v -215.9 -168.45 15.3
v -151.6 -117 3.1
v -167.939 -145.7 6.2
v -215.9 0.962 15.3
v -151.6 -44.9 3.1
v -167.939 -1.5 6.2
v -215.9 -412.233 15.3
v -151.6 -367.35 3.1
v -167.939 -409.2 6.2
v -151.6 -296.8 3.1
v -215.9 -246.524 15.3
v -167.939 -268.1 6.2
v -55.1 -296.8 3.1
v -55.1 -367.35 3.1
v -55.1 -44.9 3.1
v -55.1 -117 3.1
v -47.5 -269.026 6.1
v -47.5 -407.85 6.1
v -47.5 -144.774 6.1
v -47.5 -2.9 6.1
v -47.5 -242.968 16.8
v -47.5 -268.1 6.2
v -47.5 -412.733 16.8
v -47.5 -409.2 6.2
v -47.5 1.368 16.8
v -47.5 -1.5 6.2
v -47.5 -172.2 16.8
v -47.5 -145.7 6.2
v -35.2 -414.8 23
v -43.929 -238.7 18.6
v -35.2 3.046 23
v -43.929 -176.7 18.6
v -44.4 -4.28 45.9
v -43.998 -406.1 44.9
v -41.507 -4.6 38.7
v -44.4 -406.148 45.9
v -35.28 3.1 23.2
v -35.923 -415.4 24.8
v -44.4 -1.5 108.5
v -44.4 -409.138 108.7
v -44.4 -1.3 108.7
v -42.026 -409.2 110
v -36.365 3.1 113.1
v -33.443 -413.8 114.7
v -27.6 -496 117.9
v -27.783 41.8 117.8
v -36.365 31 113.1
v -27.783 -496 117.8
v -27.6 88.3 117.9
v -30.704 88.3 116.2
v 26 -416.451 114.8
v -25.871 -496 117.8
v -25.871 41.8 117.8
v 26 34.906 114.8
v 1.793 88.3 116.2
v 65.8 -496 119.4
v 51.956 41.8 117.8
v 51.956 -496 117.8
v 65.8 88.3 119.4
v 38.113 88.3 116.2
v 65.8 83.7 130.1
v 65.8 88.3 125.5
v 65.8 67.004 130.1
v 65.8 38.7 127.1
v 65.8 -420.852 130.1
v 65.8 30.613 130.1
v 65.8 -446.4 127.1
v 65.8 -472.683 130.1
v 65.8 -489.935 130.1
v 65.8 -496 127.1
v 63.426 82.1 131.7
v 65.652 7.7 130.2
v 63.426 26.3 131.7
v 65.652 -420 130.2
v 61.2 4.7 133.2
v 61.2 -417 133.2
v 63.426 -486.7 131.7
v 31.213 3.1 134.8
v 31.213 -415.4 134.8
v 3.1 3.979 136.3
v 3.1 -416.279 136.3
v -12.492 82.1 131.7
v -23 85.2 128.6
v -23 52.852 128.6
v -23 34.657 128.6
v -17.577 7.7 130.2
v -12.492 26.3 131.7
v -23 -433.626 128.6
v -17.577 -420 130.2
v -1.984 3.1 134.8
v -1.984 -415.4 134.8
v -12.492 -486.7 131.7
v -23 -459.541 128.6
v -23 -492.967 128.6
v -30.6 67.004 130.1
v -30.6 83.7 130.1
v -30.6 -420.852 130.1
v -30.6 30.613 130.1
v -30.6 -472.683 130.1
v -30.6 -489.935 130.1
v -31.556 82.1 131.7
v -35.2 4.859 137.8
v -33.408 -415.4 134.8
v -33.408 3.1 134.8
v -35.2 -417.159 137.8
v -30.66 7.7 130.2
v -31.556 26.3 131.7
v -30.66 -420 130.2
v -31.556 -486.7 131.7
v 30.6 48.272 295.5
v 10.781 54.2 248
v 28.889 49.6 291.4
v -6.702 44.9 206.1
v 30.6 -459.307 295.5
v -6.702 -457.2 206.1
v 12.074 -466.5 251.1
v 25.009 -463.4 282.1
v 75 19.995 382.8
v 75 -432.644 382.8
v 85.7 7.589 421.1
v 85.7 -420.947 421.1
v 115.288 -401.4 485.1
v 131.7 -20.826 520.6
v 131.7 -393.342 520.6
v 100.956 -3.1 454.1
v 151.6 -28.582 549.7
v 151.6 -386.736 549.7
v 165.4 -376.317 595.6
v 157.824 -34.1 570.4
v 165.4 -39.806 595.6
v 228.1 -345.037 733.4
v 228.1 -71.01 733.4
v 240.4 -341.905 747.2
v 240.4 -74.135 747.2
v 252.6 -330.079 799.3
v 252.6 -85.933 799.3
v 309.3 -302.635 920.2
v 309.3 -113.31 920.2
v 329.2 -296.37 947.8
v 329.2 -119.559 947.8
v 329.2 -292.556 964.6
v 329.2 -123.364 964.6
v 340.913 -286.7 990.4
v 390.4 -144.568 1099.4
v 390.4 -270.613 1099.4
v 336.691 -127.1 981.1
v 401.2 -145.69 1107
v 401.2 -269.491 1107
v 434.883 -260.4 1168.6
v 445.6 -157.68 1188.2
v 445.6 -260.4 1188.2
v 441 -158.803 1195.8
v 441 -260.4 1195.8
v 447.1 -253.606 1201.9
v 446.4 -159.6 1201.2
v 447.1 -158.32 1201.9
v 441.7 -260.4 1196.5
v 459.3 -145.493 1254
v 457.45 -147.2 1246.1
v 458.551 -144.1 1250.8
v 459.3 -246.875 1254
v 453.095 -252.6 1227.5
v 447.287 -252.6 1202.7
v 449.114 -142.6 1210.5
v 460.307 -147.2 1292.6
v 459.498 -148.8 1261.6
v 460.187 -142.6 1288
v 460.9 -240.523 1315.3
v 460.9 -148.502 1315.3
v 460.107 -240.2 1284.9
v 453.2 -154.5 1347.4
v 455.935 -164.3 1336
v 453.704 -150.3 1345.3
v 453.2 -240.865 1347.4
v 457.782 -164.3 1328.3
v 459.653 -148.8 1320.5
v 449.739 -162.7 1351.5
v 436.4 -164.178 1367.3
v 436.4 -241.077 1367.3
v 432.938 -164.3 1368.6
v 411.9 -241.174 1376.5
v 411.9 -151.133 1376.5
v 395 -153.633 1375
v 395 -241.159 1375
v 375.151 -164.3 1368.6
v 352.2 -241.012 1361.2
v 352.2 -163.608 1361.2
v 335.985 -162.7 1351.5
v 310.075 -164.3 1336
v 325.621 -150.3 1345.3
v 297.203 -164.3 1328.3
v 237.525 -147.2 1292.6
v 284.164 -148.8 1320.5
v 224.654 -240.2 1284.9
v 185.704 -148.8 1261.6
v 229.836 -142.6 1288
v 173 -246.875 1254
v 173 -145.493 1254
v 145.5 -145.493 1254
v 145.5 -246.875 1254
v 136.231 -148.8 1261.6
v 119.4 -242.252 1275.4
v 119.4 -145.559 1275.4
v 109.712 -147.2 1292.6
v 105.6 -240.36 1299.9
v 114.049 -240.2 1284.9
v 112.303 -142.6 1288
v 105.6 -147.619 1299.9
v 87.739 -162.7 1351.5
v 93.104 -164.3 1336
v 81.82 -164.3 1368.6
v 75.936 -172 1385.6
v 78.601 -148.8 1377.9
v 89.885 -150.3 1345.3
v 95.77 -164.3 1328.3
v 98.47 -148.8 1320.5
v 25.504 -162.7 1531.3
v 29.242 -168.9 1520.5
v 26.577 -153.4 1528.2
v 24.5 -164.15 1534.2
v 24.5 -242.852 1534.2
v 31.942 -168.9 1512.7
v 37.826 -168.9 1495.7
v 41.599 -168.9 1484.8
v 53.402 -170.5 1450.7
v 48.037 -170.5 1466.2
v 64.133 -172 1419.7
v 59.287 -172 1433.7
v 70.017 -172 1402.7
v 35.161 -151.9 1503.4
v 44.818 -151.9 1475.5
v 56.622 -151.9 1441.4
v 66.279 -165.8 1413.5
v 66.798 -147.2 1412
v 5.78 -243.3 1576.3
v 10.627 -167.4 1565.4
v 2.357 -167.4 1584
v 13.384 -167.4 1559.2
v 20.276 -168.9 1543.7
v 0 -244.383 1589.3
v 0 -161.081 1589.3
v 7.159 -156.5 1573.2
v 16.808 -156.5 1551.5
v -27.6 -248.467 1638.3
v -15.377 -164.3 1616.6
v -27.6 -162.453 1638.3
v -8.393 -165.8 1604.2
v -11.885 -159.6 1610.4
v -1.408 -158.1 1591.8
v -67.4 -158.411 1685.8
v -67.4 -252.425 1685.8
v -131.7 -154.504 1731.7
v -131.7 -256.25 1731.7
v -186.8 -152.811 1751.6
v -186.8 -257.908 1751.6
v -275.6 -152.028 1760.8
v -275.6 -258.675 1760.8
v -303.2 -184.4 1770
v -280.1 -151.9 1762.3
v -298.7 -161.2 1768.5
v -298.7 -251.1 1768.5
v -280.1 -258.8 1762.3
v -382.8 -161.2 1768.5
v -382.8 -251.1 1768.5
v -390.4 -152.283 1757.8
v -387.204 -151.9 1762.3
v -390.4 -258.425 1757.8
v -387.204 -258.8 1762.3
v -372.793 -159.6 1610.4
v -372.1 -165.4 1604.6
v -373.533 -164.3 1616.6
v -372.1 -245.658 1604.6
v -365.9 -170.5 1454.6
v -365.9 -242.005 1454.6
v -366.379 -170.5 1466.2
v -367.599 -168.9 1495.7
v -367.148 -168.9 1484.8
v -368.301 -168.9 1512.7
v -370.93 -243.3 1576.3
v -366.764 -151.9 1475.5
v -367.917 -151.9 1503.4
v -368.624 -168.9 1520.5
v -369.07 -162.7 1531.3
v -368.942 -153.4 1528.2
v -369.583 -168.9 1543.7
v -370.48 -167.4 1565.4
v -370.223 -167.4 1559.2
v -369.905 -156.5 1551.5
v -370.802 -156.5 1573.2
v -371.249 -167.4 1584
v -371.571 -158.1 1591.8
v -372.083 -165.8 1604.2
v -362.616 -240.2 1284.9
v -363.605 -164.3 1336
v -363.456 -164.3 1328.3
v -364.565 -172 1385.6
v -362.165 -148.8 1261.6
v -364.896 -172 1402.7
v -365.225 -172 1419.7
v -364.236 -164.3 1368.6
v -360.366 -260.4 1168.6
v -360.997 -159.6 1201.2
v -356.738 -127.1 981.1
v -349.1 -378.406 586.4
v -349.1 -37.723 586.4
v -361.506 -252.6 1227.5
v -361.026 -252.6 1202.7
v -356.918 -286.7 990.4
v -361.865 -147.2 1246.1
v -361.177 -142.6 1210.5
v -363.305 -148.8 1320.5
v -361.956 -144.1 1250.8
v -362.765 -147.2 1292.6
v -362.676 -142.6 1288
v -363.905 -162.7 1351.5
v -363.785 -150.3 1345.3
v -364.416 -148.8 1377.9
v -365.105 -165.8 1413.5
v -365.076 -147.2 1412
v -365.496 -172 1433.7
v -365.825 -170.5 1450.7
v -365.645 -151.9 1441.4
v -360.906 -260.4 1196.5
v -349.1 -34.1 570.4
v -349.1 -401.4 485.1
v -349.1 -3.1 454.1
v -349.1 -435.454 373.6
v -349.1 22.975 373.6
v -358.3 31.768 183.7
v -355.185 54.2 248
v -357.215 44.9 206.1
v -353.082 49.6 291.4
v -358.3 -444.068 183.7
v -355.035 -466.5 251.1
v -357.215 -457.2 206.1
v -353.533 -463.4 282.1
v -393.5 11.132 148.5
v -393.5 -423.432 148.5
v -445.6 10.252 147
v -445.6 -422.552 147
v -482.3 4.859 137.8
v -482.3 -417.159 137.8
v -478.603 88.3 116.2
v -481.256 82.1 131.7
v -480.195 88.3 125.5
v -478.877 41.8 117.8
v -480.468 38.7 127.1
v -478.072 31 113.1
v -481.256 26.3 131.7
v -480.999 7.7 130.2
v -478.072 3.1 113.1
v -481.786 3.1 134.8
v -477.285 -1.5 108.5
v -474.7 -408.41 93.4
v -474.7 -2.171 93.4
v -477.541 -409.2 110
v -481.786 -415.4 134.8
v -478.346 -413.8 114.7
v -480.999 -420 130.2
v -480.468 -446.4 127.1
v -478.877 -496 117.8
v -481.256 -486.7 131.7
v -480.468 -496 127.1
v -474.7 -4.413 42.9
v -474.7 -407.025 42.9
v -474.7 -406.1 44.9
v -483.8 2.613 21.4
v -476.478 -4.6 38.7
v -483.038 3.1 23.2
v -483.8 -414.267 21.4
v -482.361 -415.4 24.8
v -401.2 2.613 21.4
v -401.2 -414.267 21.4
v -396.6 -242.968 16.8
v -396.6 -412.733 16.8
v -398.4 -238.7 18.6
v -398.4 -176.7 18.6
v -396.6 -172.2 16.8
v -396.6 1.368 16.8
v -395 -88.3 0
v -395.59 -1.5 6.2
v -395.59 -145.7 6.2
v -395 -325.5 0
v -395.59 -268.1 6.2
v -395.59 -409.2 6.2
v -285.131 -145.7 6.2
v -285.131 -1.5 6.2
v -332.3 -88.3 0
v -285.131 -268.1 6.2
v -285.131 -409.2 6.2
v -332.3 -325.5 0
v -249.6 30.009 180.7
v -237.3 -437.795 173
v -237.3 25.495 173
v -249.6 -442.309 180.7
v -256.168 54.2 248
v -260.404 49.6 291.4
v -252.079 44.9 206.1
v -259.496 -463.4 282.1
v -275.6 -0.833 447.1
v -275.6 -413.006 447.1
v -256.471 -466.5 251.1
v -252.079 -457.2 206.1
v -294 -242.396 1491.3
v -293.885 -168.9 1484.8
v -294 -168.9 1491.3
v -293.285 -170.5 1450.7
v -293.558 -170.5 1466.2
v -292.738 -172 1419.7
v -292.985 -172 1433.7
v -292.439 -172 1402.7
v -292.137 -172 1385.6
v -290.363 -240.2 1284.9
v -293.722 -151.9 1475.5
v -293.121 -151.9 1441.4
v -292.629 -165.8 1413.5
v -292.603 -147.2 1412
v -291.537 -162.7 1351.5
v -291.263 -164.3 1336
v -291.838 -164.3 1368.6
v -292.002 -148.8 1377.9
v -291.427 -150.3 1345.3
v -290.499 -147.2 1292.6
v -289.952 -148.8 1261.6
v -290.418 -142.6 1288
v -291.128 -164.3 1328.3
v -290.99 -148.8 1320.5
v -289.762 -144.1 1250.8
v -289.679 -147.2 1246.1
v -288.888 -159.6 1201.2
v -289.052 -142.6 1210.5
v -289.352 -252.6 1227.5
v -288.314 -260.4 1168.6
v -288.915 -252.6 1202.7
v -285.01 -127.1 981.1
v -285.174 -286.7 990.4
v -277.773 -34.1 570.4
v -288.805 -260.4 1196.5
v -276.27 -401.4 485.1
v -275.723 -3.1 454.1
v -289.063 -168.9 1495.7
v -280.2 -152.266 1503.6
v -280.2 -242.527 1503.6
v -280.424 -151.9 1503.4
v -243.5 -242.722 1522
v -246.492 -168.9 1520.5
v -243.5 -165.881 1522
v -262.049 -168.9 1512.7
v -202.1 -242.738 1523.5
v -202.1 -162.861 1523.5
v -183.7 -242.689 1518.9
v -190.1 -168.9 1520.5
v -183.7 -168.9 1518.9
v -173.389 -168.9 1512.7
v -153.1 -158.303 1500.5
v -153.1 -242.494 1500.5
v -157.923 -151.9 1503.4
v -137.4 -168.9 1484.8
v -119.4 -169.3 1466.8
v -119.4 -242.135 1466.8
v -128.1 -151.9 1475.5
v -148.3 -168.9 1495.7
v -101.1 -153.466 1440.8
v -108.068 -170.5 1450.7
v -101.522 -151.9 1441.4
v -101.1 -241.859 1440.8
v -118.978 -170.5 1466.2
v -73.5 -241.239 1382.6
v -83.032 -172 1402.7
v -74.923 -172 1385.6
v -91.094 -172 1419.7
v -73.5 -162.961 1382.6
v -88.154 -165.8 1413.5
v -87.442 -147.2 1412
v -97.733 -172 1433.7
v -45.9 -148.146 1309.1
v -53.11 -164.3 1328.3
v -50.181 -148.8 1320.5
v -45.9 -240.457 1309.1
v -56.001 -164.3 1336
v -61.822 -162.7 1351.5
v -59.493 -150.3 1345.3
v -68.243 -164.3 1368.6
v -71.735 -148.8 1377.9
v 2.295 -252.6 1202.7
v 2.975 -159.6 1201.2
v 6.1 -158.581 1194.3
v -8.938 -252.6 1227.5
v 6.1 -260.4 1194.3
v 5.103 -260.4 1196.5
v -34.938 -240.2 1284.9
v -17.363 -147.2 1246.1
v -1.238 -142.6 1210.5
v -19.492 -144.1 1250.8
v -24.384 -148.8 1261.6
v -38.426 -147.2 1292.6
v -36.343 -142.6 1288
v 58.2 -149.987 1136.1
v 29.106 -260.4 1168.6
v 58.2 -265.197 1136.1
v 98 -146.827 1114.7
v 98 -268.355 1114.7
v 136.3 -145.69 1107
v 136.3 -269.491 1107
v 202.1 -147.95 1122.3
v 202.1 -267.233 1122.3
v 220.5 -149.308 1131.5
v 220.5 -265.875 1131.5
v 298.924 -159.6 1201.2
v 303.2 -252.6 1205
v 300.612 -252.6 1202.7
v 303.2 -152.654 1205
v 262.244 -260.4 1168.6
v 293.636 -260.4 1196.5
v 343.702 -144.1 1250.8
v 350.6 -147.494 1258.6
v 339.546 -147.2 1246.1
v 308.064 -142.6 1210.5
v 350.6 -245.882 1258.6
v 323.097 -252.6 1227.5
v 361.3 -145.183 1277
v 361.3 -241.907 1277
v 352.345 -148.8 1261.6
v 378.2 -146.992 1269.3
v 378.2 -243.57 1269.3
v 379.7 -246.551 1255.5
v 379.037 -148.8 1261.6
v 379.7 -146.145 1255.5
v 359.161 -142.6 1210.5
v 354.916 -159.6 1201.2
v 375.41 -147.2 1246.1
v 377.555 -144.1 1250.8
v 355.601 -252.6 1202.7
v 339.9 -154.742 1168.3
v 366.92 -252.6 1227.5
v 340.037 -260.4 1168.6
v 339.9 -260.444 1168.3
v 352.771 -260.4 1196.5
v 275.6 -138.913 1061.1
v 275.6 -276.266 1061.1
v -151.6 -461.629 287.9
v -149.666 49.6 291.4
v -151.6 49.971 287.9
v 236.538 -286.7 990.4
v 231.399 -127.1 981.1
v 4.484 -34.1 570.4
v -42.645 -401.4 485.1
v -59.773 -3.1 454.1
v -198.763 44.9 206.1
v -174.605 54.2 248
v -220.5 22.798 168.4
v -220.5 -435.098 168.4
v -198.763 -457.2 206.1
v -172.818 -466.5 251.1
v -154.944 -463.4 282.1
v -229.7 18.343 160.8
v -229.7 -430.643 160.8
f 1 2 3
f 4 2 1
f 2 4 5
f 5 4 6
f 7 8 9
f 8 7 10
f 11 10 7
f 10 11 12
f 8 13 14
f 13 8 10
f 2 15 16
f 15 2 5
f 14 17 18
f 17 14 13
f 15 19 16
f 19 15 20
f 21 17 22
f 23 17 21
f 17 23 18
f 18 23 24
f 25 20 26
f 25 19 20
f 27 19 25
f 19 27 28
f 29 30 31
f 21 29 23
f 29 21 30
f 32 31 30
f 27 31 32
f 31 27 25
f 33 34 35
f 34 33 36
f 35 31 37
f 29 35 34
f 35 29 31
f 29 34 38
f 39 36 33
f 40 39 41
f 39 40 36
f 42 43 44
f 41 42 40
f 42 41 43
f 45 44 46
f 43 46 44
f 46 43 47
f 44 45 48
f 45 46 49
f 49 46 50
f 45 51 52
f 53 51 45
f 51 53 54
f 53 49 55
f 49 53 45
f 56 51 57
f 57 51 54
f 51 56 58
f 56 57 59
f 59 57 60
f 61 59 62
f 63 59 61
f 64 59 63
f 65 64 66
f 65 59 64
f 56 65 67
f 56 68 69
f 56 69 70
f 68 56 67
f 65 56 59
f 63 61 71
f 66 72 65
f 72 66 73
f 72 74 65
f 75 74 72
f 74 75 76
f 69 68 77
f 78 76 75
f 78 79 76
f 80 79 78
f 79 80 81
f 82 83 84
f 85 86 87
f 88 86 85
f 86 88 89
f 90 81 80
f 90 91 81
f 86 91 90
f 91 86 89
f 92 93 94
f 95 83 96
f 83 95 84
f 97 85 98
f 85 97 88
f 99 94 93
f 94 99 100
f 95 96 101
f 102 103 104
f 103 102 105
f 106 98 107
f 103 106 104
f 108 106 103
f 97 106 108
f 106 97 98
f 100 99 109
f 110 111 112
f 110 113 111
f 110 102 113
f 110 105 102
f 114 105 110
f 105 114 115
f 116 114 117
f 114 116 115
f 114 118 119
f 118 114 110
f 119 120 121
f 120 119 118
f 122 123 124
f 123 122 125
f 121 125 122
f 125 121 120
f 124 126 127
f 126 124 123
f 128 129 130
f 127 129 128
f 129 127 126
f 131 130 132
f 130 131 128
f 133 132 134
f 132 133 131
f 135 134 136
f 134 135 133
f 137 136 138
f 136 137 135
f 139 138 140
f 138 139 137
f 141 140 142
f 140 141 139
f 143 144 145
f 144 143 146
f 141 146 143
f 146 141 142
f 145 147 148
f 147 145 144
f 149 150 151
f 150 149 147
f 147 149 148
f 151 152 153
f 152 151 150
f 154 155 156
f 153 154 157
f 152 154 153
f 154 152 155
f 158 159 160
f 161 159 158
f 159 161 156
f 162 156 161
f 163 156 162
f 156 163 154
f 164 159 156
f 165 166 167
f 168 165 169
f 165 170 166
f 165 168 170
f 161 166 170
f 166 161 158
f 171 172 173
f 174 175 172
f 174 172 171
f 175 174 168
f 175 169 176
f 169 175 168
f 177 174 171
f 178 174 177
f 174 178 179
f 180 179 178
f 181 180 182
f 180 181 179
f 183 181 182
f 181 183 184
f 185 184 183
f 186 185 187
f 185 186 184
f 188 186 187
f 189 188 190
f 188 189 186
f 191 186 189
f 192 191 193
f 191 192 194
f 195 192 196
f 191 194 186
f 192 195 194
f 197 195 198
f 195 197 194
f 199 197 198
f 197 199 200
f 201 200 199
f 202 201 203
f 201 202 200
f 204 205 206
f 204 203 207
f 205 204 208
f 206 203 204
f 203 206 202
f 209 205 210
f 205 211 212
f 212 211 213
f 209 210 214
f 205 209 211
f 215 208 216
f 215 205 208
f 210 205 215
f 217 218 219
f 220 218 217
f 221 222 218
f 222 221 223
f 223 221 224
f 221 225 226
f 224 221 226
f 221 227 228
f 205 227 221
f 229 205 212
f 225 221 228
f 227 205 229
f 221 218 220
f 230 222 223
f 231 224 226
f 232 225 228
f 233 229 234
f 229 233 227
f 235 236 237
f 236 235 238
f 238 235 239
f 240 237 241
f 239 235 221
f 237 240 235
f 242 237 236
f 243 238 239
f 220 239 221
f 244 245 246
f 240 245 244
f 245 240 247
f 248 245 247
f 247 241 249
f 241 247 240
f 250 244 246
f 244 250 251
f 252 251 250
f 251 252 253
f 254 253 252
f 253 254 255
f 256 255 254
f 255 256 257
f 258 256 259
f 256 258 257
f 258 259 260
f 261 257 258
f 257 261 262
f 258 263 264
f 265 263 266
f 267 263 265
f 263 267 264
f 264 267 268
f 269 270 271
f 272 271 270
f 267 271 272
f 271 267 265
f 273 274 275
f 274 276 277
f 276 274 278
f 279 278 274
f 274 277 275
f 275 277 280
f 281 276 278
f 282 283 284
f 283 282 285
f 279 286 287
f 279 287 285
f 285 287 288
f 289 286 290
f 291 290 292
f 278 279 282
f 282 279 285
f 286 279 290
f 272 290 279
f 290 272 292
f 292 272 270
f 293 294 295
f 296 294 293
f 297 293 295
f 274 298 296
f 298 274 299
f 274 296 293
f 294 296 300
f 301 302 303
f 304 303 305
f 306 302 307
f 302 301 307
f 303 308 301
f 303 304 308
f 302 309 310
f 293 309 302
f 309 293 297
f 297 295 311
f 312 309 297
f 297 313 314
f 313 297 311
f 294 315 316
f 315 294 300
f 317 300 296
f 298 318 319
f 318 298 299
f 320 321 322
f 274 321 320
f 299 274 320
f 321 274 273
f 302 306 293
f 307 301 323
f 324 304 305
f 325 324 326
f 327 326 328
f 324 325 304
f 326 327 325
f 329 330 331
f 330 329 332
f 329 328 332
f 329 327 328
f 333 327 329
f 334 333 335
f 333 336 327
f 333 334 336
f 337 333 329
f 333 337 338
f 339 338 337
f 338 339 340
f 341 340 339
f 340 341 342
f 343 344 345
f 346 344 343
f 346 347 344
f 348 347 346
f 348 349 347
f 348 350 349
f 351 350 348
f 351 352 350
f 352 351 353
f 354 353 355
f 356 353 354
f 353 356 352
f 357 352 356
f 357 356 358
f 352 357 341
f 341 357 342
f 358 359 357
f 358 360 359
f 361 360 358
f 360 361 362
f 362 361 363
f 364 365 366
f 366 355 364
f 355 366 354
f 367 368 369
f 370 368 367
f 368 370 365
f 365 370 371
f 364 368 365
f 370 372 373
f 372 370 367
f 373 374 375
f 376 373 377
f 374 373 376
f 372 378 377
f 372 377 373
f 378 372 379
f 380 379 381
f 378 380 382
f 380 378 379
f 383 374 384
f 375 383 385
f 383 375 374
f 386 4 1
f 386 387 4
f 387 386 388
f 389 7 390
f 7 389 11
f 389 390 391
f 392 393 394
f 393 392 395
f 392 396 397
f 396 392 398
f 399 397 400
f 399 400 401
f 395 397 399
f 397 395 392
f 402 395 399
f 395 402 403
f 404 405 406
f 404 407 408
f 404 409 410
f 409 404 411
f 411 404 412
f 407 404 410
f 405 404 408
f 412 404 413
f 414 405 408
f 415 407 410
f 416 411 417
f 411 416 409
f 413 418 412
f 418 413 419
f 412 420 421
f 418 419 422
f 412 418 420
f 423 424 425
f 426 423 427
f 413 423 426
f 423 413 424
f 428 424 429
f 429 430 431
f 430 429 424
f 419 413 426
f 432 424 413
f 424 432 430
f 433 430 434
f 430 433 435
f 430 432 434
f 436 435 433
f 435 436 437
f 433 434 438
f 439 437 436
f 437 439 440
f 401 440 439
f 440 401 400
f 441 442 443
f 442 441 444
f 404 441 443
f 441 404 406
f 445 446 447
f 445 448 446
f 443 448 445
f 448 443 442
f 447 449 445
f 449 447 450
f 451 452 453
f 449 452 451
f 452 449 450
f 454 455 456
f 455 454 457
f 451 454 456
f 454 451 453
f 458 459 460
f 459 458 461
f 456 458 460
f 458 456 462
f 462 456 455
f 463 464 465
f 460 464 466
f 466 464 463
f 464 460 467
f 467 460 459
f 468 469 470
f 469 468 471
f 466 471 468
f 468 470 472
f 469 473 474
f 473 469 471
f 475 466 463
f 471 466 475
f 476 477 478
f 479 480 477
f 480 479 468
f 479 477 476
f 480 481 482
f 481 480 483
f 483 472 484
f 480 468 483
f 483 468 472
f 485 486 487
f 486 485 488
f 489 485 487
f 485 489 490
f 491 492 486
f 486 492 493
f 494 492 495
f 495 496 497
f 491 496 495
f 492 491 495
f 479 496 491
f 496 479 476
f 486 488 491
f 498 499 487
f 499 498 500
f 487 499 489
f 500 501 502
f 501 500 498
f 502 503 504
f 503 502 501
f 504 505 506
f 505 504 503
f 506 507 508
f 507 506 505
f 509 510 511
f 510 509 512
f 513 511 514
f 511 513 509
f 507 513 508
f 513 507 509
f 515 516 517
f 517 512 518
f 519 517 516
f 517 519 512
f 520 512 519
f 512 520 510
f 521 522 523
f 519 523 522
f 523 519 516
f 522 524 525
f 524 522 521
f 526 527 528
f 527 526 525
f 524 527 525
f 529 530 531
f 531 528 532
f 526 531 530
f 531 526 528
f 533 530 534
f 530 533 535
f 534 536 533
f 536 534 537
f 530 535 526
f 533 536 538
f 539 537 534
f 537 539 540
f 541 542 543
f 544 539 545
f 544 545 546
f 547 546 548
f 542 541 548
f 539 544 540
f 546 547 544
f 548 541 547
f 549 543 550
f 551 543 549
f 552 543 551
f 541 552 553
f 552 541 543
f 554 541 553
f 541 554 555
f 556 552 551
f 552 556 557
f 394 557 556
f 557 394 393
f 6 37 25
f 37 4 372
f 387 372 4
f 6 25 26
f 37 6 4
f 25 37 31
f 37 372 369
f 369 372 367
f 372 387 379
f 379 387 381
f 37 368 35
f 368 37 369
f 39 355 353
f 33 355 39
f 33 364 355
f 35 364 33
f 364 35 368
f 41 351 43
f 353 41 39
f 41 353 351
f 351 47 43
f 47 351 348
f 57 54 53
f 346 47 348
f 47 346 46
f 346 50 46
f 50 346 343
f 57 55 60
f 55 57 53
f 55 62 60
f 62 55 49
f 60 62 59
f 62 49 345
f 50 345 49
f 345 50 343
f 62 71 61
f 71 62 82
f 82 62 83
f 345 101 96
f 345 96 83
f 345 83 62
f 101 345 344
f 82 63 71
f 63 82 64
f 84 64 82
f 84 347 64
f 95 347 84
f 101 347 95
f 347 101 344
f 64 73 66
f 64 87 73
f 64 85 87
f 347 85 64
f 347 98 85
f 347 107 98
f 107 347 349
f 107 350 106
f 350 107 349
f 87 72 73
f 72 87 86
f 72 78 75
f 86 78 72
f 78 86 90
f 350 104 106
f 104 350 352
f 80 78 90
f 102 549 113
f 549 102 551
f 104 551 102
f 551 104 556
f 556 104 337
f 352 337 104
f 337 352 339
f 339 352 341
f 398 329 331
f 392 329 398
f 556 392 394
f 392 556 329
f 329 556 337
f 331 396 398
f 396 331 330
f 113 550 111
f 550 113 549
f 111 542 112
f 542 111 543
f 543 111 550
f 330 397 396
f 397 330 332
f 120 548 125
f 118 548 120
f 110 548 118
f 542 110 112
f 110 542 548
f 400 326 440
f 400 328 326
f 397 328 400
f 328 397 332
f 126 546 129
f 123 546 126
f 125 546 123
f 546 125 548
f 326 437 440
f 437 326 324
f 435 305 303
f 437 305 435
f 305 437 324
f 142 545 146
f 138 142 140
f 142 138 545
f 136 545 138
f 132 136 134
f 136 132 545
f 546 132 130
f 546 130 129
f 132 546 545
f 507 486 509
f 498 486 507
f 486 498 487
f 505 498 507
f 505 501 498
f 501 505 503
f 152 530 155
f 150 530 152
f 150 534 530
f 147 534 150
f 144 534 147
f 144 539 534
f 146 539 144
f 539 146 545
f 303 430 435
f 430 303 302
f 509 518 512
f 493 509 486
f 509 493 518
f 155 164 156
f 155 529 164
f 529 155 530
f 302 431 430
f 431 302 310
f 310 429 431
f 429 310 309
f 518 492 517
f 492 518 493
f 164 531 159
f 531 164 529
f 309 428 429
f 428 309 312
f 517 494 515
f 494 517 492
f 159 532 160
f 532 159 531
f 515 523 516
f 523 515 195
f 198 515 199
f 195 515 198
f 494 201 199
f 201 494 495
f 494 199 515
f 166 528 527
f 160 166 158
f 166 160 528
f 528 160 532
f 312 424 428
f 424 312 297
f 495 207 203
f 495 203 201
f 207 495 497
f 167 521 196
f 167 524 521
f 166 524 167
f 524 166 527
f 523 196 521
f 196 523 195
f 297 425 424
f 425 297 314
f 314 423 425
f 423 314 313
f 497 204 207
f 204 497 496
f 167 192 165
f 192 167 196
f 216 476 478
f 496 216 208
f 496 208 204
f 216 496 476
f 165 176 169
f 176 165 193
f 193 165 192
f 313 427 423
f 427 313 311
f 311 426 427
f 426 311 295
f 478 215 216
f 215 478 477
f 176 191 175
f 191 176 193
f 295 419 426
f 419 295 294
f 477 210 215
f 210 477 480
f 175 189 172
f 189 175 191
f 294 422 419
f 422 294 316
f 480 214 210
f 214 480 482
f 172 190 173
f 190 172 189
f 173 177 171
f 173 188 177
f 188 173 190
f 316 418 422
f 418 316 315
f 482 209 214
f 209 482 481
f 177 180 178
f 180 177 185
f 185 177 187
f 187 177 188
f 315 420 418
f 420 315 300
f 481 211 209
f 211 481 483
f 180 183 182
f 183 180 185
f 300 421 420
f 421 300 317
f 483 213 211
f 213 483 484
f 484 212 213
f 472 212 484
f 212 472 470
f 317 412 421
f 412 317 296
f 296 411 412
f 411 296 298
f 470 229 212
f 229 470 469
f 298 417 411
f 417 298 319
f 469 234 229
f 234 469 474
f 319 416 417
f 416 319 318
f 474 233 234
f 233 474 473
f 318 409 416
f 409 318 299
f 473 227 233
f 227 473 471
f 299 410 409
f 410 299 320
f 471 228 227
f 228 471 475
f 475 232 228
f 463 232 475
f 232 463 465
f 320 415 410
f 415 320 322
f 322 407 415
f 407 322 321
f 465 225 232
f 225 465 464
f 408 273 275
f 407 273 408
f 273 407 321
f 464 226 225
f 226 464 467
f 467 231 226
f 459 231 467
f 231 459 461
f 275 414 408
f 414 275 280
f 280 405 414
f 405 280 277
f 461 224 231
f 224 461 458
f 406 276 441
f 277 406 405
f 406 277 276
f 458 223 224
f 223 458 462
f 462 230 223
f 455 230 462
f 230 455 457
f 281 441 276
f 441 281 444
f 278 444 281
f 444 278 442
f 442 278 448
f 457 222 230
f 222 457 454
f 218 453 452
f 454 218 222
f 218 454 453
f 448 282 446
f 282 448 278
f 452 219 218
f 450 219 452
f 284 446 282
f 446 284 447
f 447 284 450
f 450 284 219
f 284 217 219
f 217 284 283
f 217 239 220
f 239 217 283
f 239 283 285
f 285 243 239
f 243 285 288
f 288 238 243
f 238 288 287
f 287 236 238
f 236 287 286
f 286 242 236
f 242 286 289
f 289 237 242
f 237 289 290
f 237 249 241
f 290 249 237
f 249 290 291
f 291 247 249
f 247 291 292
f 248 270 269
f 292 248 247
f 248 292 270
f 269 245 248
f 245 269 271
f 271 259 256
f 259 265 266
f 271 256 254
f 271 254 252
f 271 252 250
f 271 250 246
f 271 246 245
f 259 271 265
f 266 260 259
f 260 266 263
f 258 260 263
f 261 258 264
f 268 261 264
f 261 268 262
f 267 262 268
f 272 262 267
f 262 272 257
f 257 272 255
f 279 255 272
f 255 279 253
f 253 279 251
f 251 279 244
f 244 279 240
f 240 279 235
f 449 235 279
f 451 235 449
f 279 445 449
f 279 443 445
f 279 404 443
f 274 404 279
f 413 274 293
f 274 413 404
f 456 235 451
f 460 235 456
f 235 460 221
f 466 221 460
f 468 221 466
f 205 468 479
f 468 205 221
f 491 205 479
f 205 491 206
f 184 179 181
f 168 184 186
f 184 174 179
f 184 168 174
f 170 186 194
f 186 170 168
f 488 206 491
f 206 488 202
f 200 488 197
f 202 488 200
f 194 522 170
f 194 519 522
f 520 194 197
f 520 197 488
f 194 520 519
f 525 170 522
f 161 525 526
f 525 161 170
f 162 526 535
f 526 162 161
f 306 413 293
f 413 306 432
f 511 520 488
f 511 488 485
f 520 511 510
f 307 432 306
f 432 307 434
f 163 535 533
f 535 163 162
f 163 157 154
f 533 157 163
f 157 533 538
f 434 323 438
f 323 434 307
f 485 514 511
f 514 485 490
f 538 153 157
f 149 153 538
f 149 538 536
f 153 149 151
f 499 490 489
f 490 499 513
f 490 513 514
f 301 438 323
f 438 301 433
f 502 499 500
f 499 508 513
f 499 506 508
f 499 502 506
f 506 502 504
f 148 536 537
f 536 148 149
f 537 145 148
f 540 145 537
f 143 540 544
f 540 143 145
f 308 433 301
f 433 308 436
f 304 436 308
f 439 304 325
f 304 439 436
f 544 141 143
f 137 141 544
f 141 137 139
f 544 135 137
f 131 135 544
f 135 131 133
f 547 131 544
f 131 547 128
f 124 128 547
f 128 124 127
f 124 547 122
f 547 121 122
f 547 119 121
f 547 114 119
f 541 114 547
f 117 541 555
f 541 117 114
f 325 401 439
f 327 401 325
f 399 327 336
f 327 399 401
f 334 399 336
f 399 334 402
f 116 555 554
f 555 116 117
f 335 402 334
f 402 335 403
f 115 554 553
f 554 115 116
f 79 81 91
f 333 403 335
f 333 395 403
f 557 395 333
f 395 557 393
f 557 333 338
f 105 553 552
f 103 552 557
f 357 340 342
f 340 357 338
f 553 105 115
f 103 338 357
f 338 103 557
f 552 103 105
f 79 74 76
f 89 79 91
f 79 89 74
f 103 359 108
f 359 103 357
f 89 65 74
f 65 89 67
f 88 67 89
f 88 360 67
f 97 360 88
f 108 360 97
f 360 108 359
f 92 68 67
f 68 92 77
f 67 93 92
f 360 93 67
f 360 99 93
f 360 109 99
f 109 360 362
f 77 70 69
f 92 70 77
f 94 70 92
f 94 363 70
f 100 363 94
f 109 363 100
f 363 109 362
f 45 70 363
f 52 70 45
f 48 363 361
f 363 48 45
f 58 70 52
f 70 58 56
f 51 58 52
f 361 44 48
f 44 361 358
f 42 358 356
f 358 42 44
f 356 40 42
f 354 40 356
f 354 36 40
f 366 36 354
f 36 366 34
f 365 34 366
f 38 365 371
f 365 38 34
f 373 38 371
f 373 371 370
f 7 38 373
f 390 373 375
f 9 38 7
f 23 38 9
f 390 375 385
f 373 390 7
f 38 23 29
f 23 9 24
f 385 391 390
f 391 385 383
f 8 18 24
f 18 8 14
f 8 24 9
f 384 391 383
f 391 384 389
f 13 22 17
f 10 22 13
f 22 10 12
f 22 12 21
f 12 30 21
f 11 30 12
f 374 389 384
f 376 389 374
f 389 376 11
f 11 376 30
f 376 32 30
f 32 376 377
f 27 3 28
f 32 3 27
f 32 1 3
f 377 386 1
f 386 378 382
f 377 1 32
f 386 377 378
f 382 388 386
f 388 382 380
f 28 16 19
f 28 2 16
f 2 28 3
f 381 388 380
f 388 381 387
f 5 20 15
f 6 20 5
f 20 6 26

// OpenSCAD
// harp_real.scad -- TWO-VIEW orthographic shape carve of the real harp.
// front silhouette (az90) and side silhouette (az0), both centered on the orbit
// axis and scaled so height=1770 mm, intersected to a true 3D solid.
module front2d() difference(){
  polygon([[-382.8,1768.5],[-390.4,1757.8],[-372.1,1604.6],[-365.9,1454.6],[-349.1,586.4],[-349.1,373.6],[-358.3,183.7],[-393.5,148.5],[-445.6,147.0],[-482.3,137.8],[-474.7,93.4],[-474.7,42.9],[-483.8,21.4],[-401.2,21.4],[-396.6,16.8],[-395.0,0.0],[-332.3,0.0],[-215.9,15.3],[-151.6,3.1],[-55.1,3.1],[-47.5,6.1],[-47.5,16.8],[-35.2,23.0],[-44.4,45.9],[-44.4,108.7],[-27.6,117.9],[26.0,114.8],[65.8,119.4],[65.8,130.1],[61.2,133.2],[3.1,136.3],[-23.0,128.6],[-30.6,130.1],[-35.2,137.8],[30.6,295.5],[75.0,382.8],[85.7,421.1],[131.7,520.6],[151.6,549.7],[165.4,595.6],[228.1,733.4],[240.4,747.2],[252.6,799.3],[309.3,920.2],[329.2,947.8],[329.2,964.6],[390.4,1099.4],[401.2,1107.0],[445.6,1188.2],[441.0,1195.8],[447.1,1201.9],[459.3,1254.0],[460.9,1315.3],[453.2,1347.4],[436.4,1367.3],[411.9,1376.5],[395.0,1375.0],[352.2,1361.2],[173.0,1254.0],[145.5,1254.0],[119.4,1275.4],[105.6,1299.9],[24.5,1534.2],[0.0,1589.3],[-27.6,1638.3],[-67.4,1685.8],[-131.7,1731.7],[-186.8,1751.6],[-275.6,1760.8],[-303.2,1770.0]]);
  polygon([[-202.1,1523.5],[-183.7,1518.9],[-153.1,1500.5],[-119.4,1466.8],[-101.1,1440.8],[-73.5,1382.6],[-45.9,1309.1],[6.1,1194.3],[58.2,1136.1],[98.0,1114.7],[136.3,1107.0],[202.1,1122.3],[220.5,1131.5],[303.2,1205.0],[350.6,1258.6],[361.3,1277.0],[378.2,1269.3],[379.7,1255.5],[339.9,1168.3],[275.6,1061.1],[-151.6,287.9],[-220.5,168.4],[-229.7,160.8],[-237.3,173.0],[-249.6,180.7],[-275.6,447.1],[-294.0,1491.3],[-280.2,1503.6],[-243.5,1522.0]]);
}
module side2d()  difference(){
  polygon([[-251.1,1768.5],[-258.8,1762.3],[-243.3,1576.3],[-240.2,1284.9],[-252.6,1227.5],[-252.6,1202.7],[-260.4,1196.5],[-260.4,1168.6],[-286.7,990.4],[-401.4,485.1],[-463.4,282.1],[-466.5,251.1],[-457.2,206.1],[-415.4,134.8],[-420.0,130.2],[-446.4,127.1],[-486.7,131.7],[-496.0,127.1],[-496.0,117.8],[-413.8,114.7],[-409.2,110.0],[-406.1,44.9],[-415.4,24.8],[-409.2,6.2],[-325.5,0.0],[-268.1,6.2],[-238.7,18.6],[-176.7,18.6],[-145.7,6.2],[-88.3,0.0],[-1.5,6.2],[3.1,23.2],[-4.6,38.7],[-1.5,108.5],[3.1,113.1],[31.0,113.1],[41.8,117.8],[88.3,116.2],[88.3,125.5],[82.1,131.7],[38.7,127.1],[26.3,131.7],[7.7,130.2],[3.1,134.8],[44.9,206.1],[54.2,248.0],[49.6,291.4],[-3.1,454.1],[-34.1,570.4],[-127.1,981.1],[-159.6,1201.2],[-142.6,1210.5],[-147.2,1246.1],[-144.1,1250.8],[-148.8,1261.6],[-142.6,1288.0],[-147.2,1292.6],[-148.8,1320.5],[-164.3,1328.3],[-164.3,1336.0],[-150.3,1345.3],[-162.7,1351.5],[-164.3,1368.6],[-148.8,1377.9],[-172.0,1385.6],[-172.0,1402.7],[-147.2,1412.0],[-165.8,1413.5],[-172.0,1419.7],[-172.0,1433.7],[-151.9,1441.4],[-170.5,1450.7],[-170.5,1466.2],[-151.9,1475.5],[-168.9,1484.8],[-168.9,1495.7],[-151.9,1503.4],[-168.9,1512.7],[-168.9,1520.5],[-153.4,1528.2],[-162.7,1531.3],[-168.9,1543.7],[-156.5,1551.5],[-167.4,1559.2],[-167.4,1565.4],[-156.5,1573.2],[-167.4,1584.0],[-158.1,1591.8],[-165.8,1604.2],[-159.6,1610.4],[-164.3,1616.6],[-151.9,1762.3],[-161.2,1768.5],[-184.4,1770.0]]);
}
intersection() {
  multmatrix([[1,0,0,0],[0,0,1,0],[0,1,0,0],[0,0,0,1]]) linear_extrude(1323,center=true) front2d();
  multmatrix([[0,0,1,0],[1,0,0,0],[0,1,0,0],[0,0,0,1]]) linear_extrude(1323,center=true) side2d();
}
